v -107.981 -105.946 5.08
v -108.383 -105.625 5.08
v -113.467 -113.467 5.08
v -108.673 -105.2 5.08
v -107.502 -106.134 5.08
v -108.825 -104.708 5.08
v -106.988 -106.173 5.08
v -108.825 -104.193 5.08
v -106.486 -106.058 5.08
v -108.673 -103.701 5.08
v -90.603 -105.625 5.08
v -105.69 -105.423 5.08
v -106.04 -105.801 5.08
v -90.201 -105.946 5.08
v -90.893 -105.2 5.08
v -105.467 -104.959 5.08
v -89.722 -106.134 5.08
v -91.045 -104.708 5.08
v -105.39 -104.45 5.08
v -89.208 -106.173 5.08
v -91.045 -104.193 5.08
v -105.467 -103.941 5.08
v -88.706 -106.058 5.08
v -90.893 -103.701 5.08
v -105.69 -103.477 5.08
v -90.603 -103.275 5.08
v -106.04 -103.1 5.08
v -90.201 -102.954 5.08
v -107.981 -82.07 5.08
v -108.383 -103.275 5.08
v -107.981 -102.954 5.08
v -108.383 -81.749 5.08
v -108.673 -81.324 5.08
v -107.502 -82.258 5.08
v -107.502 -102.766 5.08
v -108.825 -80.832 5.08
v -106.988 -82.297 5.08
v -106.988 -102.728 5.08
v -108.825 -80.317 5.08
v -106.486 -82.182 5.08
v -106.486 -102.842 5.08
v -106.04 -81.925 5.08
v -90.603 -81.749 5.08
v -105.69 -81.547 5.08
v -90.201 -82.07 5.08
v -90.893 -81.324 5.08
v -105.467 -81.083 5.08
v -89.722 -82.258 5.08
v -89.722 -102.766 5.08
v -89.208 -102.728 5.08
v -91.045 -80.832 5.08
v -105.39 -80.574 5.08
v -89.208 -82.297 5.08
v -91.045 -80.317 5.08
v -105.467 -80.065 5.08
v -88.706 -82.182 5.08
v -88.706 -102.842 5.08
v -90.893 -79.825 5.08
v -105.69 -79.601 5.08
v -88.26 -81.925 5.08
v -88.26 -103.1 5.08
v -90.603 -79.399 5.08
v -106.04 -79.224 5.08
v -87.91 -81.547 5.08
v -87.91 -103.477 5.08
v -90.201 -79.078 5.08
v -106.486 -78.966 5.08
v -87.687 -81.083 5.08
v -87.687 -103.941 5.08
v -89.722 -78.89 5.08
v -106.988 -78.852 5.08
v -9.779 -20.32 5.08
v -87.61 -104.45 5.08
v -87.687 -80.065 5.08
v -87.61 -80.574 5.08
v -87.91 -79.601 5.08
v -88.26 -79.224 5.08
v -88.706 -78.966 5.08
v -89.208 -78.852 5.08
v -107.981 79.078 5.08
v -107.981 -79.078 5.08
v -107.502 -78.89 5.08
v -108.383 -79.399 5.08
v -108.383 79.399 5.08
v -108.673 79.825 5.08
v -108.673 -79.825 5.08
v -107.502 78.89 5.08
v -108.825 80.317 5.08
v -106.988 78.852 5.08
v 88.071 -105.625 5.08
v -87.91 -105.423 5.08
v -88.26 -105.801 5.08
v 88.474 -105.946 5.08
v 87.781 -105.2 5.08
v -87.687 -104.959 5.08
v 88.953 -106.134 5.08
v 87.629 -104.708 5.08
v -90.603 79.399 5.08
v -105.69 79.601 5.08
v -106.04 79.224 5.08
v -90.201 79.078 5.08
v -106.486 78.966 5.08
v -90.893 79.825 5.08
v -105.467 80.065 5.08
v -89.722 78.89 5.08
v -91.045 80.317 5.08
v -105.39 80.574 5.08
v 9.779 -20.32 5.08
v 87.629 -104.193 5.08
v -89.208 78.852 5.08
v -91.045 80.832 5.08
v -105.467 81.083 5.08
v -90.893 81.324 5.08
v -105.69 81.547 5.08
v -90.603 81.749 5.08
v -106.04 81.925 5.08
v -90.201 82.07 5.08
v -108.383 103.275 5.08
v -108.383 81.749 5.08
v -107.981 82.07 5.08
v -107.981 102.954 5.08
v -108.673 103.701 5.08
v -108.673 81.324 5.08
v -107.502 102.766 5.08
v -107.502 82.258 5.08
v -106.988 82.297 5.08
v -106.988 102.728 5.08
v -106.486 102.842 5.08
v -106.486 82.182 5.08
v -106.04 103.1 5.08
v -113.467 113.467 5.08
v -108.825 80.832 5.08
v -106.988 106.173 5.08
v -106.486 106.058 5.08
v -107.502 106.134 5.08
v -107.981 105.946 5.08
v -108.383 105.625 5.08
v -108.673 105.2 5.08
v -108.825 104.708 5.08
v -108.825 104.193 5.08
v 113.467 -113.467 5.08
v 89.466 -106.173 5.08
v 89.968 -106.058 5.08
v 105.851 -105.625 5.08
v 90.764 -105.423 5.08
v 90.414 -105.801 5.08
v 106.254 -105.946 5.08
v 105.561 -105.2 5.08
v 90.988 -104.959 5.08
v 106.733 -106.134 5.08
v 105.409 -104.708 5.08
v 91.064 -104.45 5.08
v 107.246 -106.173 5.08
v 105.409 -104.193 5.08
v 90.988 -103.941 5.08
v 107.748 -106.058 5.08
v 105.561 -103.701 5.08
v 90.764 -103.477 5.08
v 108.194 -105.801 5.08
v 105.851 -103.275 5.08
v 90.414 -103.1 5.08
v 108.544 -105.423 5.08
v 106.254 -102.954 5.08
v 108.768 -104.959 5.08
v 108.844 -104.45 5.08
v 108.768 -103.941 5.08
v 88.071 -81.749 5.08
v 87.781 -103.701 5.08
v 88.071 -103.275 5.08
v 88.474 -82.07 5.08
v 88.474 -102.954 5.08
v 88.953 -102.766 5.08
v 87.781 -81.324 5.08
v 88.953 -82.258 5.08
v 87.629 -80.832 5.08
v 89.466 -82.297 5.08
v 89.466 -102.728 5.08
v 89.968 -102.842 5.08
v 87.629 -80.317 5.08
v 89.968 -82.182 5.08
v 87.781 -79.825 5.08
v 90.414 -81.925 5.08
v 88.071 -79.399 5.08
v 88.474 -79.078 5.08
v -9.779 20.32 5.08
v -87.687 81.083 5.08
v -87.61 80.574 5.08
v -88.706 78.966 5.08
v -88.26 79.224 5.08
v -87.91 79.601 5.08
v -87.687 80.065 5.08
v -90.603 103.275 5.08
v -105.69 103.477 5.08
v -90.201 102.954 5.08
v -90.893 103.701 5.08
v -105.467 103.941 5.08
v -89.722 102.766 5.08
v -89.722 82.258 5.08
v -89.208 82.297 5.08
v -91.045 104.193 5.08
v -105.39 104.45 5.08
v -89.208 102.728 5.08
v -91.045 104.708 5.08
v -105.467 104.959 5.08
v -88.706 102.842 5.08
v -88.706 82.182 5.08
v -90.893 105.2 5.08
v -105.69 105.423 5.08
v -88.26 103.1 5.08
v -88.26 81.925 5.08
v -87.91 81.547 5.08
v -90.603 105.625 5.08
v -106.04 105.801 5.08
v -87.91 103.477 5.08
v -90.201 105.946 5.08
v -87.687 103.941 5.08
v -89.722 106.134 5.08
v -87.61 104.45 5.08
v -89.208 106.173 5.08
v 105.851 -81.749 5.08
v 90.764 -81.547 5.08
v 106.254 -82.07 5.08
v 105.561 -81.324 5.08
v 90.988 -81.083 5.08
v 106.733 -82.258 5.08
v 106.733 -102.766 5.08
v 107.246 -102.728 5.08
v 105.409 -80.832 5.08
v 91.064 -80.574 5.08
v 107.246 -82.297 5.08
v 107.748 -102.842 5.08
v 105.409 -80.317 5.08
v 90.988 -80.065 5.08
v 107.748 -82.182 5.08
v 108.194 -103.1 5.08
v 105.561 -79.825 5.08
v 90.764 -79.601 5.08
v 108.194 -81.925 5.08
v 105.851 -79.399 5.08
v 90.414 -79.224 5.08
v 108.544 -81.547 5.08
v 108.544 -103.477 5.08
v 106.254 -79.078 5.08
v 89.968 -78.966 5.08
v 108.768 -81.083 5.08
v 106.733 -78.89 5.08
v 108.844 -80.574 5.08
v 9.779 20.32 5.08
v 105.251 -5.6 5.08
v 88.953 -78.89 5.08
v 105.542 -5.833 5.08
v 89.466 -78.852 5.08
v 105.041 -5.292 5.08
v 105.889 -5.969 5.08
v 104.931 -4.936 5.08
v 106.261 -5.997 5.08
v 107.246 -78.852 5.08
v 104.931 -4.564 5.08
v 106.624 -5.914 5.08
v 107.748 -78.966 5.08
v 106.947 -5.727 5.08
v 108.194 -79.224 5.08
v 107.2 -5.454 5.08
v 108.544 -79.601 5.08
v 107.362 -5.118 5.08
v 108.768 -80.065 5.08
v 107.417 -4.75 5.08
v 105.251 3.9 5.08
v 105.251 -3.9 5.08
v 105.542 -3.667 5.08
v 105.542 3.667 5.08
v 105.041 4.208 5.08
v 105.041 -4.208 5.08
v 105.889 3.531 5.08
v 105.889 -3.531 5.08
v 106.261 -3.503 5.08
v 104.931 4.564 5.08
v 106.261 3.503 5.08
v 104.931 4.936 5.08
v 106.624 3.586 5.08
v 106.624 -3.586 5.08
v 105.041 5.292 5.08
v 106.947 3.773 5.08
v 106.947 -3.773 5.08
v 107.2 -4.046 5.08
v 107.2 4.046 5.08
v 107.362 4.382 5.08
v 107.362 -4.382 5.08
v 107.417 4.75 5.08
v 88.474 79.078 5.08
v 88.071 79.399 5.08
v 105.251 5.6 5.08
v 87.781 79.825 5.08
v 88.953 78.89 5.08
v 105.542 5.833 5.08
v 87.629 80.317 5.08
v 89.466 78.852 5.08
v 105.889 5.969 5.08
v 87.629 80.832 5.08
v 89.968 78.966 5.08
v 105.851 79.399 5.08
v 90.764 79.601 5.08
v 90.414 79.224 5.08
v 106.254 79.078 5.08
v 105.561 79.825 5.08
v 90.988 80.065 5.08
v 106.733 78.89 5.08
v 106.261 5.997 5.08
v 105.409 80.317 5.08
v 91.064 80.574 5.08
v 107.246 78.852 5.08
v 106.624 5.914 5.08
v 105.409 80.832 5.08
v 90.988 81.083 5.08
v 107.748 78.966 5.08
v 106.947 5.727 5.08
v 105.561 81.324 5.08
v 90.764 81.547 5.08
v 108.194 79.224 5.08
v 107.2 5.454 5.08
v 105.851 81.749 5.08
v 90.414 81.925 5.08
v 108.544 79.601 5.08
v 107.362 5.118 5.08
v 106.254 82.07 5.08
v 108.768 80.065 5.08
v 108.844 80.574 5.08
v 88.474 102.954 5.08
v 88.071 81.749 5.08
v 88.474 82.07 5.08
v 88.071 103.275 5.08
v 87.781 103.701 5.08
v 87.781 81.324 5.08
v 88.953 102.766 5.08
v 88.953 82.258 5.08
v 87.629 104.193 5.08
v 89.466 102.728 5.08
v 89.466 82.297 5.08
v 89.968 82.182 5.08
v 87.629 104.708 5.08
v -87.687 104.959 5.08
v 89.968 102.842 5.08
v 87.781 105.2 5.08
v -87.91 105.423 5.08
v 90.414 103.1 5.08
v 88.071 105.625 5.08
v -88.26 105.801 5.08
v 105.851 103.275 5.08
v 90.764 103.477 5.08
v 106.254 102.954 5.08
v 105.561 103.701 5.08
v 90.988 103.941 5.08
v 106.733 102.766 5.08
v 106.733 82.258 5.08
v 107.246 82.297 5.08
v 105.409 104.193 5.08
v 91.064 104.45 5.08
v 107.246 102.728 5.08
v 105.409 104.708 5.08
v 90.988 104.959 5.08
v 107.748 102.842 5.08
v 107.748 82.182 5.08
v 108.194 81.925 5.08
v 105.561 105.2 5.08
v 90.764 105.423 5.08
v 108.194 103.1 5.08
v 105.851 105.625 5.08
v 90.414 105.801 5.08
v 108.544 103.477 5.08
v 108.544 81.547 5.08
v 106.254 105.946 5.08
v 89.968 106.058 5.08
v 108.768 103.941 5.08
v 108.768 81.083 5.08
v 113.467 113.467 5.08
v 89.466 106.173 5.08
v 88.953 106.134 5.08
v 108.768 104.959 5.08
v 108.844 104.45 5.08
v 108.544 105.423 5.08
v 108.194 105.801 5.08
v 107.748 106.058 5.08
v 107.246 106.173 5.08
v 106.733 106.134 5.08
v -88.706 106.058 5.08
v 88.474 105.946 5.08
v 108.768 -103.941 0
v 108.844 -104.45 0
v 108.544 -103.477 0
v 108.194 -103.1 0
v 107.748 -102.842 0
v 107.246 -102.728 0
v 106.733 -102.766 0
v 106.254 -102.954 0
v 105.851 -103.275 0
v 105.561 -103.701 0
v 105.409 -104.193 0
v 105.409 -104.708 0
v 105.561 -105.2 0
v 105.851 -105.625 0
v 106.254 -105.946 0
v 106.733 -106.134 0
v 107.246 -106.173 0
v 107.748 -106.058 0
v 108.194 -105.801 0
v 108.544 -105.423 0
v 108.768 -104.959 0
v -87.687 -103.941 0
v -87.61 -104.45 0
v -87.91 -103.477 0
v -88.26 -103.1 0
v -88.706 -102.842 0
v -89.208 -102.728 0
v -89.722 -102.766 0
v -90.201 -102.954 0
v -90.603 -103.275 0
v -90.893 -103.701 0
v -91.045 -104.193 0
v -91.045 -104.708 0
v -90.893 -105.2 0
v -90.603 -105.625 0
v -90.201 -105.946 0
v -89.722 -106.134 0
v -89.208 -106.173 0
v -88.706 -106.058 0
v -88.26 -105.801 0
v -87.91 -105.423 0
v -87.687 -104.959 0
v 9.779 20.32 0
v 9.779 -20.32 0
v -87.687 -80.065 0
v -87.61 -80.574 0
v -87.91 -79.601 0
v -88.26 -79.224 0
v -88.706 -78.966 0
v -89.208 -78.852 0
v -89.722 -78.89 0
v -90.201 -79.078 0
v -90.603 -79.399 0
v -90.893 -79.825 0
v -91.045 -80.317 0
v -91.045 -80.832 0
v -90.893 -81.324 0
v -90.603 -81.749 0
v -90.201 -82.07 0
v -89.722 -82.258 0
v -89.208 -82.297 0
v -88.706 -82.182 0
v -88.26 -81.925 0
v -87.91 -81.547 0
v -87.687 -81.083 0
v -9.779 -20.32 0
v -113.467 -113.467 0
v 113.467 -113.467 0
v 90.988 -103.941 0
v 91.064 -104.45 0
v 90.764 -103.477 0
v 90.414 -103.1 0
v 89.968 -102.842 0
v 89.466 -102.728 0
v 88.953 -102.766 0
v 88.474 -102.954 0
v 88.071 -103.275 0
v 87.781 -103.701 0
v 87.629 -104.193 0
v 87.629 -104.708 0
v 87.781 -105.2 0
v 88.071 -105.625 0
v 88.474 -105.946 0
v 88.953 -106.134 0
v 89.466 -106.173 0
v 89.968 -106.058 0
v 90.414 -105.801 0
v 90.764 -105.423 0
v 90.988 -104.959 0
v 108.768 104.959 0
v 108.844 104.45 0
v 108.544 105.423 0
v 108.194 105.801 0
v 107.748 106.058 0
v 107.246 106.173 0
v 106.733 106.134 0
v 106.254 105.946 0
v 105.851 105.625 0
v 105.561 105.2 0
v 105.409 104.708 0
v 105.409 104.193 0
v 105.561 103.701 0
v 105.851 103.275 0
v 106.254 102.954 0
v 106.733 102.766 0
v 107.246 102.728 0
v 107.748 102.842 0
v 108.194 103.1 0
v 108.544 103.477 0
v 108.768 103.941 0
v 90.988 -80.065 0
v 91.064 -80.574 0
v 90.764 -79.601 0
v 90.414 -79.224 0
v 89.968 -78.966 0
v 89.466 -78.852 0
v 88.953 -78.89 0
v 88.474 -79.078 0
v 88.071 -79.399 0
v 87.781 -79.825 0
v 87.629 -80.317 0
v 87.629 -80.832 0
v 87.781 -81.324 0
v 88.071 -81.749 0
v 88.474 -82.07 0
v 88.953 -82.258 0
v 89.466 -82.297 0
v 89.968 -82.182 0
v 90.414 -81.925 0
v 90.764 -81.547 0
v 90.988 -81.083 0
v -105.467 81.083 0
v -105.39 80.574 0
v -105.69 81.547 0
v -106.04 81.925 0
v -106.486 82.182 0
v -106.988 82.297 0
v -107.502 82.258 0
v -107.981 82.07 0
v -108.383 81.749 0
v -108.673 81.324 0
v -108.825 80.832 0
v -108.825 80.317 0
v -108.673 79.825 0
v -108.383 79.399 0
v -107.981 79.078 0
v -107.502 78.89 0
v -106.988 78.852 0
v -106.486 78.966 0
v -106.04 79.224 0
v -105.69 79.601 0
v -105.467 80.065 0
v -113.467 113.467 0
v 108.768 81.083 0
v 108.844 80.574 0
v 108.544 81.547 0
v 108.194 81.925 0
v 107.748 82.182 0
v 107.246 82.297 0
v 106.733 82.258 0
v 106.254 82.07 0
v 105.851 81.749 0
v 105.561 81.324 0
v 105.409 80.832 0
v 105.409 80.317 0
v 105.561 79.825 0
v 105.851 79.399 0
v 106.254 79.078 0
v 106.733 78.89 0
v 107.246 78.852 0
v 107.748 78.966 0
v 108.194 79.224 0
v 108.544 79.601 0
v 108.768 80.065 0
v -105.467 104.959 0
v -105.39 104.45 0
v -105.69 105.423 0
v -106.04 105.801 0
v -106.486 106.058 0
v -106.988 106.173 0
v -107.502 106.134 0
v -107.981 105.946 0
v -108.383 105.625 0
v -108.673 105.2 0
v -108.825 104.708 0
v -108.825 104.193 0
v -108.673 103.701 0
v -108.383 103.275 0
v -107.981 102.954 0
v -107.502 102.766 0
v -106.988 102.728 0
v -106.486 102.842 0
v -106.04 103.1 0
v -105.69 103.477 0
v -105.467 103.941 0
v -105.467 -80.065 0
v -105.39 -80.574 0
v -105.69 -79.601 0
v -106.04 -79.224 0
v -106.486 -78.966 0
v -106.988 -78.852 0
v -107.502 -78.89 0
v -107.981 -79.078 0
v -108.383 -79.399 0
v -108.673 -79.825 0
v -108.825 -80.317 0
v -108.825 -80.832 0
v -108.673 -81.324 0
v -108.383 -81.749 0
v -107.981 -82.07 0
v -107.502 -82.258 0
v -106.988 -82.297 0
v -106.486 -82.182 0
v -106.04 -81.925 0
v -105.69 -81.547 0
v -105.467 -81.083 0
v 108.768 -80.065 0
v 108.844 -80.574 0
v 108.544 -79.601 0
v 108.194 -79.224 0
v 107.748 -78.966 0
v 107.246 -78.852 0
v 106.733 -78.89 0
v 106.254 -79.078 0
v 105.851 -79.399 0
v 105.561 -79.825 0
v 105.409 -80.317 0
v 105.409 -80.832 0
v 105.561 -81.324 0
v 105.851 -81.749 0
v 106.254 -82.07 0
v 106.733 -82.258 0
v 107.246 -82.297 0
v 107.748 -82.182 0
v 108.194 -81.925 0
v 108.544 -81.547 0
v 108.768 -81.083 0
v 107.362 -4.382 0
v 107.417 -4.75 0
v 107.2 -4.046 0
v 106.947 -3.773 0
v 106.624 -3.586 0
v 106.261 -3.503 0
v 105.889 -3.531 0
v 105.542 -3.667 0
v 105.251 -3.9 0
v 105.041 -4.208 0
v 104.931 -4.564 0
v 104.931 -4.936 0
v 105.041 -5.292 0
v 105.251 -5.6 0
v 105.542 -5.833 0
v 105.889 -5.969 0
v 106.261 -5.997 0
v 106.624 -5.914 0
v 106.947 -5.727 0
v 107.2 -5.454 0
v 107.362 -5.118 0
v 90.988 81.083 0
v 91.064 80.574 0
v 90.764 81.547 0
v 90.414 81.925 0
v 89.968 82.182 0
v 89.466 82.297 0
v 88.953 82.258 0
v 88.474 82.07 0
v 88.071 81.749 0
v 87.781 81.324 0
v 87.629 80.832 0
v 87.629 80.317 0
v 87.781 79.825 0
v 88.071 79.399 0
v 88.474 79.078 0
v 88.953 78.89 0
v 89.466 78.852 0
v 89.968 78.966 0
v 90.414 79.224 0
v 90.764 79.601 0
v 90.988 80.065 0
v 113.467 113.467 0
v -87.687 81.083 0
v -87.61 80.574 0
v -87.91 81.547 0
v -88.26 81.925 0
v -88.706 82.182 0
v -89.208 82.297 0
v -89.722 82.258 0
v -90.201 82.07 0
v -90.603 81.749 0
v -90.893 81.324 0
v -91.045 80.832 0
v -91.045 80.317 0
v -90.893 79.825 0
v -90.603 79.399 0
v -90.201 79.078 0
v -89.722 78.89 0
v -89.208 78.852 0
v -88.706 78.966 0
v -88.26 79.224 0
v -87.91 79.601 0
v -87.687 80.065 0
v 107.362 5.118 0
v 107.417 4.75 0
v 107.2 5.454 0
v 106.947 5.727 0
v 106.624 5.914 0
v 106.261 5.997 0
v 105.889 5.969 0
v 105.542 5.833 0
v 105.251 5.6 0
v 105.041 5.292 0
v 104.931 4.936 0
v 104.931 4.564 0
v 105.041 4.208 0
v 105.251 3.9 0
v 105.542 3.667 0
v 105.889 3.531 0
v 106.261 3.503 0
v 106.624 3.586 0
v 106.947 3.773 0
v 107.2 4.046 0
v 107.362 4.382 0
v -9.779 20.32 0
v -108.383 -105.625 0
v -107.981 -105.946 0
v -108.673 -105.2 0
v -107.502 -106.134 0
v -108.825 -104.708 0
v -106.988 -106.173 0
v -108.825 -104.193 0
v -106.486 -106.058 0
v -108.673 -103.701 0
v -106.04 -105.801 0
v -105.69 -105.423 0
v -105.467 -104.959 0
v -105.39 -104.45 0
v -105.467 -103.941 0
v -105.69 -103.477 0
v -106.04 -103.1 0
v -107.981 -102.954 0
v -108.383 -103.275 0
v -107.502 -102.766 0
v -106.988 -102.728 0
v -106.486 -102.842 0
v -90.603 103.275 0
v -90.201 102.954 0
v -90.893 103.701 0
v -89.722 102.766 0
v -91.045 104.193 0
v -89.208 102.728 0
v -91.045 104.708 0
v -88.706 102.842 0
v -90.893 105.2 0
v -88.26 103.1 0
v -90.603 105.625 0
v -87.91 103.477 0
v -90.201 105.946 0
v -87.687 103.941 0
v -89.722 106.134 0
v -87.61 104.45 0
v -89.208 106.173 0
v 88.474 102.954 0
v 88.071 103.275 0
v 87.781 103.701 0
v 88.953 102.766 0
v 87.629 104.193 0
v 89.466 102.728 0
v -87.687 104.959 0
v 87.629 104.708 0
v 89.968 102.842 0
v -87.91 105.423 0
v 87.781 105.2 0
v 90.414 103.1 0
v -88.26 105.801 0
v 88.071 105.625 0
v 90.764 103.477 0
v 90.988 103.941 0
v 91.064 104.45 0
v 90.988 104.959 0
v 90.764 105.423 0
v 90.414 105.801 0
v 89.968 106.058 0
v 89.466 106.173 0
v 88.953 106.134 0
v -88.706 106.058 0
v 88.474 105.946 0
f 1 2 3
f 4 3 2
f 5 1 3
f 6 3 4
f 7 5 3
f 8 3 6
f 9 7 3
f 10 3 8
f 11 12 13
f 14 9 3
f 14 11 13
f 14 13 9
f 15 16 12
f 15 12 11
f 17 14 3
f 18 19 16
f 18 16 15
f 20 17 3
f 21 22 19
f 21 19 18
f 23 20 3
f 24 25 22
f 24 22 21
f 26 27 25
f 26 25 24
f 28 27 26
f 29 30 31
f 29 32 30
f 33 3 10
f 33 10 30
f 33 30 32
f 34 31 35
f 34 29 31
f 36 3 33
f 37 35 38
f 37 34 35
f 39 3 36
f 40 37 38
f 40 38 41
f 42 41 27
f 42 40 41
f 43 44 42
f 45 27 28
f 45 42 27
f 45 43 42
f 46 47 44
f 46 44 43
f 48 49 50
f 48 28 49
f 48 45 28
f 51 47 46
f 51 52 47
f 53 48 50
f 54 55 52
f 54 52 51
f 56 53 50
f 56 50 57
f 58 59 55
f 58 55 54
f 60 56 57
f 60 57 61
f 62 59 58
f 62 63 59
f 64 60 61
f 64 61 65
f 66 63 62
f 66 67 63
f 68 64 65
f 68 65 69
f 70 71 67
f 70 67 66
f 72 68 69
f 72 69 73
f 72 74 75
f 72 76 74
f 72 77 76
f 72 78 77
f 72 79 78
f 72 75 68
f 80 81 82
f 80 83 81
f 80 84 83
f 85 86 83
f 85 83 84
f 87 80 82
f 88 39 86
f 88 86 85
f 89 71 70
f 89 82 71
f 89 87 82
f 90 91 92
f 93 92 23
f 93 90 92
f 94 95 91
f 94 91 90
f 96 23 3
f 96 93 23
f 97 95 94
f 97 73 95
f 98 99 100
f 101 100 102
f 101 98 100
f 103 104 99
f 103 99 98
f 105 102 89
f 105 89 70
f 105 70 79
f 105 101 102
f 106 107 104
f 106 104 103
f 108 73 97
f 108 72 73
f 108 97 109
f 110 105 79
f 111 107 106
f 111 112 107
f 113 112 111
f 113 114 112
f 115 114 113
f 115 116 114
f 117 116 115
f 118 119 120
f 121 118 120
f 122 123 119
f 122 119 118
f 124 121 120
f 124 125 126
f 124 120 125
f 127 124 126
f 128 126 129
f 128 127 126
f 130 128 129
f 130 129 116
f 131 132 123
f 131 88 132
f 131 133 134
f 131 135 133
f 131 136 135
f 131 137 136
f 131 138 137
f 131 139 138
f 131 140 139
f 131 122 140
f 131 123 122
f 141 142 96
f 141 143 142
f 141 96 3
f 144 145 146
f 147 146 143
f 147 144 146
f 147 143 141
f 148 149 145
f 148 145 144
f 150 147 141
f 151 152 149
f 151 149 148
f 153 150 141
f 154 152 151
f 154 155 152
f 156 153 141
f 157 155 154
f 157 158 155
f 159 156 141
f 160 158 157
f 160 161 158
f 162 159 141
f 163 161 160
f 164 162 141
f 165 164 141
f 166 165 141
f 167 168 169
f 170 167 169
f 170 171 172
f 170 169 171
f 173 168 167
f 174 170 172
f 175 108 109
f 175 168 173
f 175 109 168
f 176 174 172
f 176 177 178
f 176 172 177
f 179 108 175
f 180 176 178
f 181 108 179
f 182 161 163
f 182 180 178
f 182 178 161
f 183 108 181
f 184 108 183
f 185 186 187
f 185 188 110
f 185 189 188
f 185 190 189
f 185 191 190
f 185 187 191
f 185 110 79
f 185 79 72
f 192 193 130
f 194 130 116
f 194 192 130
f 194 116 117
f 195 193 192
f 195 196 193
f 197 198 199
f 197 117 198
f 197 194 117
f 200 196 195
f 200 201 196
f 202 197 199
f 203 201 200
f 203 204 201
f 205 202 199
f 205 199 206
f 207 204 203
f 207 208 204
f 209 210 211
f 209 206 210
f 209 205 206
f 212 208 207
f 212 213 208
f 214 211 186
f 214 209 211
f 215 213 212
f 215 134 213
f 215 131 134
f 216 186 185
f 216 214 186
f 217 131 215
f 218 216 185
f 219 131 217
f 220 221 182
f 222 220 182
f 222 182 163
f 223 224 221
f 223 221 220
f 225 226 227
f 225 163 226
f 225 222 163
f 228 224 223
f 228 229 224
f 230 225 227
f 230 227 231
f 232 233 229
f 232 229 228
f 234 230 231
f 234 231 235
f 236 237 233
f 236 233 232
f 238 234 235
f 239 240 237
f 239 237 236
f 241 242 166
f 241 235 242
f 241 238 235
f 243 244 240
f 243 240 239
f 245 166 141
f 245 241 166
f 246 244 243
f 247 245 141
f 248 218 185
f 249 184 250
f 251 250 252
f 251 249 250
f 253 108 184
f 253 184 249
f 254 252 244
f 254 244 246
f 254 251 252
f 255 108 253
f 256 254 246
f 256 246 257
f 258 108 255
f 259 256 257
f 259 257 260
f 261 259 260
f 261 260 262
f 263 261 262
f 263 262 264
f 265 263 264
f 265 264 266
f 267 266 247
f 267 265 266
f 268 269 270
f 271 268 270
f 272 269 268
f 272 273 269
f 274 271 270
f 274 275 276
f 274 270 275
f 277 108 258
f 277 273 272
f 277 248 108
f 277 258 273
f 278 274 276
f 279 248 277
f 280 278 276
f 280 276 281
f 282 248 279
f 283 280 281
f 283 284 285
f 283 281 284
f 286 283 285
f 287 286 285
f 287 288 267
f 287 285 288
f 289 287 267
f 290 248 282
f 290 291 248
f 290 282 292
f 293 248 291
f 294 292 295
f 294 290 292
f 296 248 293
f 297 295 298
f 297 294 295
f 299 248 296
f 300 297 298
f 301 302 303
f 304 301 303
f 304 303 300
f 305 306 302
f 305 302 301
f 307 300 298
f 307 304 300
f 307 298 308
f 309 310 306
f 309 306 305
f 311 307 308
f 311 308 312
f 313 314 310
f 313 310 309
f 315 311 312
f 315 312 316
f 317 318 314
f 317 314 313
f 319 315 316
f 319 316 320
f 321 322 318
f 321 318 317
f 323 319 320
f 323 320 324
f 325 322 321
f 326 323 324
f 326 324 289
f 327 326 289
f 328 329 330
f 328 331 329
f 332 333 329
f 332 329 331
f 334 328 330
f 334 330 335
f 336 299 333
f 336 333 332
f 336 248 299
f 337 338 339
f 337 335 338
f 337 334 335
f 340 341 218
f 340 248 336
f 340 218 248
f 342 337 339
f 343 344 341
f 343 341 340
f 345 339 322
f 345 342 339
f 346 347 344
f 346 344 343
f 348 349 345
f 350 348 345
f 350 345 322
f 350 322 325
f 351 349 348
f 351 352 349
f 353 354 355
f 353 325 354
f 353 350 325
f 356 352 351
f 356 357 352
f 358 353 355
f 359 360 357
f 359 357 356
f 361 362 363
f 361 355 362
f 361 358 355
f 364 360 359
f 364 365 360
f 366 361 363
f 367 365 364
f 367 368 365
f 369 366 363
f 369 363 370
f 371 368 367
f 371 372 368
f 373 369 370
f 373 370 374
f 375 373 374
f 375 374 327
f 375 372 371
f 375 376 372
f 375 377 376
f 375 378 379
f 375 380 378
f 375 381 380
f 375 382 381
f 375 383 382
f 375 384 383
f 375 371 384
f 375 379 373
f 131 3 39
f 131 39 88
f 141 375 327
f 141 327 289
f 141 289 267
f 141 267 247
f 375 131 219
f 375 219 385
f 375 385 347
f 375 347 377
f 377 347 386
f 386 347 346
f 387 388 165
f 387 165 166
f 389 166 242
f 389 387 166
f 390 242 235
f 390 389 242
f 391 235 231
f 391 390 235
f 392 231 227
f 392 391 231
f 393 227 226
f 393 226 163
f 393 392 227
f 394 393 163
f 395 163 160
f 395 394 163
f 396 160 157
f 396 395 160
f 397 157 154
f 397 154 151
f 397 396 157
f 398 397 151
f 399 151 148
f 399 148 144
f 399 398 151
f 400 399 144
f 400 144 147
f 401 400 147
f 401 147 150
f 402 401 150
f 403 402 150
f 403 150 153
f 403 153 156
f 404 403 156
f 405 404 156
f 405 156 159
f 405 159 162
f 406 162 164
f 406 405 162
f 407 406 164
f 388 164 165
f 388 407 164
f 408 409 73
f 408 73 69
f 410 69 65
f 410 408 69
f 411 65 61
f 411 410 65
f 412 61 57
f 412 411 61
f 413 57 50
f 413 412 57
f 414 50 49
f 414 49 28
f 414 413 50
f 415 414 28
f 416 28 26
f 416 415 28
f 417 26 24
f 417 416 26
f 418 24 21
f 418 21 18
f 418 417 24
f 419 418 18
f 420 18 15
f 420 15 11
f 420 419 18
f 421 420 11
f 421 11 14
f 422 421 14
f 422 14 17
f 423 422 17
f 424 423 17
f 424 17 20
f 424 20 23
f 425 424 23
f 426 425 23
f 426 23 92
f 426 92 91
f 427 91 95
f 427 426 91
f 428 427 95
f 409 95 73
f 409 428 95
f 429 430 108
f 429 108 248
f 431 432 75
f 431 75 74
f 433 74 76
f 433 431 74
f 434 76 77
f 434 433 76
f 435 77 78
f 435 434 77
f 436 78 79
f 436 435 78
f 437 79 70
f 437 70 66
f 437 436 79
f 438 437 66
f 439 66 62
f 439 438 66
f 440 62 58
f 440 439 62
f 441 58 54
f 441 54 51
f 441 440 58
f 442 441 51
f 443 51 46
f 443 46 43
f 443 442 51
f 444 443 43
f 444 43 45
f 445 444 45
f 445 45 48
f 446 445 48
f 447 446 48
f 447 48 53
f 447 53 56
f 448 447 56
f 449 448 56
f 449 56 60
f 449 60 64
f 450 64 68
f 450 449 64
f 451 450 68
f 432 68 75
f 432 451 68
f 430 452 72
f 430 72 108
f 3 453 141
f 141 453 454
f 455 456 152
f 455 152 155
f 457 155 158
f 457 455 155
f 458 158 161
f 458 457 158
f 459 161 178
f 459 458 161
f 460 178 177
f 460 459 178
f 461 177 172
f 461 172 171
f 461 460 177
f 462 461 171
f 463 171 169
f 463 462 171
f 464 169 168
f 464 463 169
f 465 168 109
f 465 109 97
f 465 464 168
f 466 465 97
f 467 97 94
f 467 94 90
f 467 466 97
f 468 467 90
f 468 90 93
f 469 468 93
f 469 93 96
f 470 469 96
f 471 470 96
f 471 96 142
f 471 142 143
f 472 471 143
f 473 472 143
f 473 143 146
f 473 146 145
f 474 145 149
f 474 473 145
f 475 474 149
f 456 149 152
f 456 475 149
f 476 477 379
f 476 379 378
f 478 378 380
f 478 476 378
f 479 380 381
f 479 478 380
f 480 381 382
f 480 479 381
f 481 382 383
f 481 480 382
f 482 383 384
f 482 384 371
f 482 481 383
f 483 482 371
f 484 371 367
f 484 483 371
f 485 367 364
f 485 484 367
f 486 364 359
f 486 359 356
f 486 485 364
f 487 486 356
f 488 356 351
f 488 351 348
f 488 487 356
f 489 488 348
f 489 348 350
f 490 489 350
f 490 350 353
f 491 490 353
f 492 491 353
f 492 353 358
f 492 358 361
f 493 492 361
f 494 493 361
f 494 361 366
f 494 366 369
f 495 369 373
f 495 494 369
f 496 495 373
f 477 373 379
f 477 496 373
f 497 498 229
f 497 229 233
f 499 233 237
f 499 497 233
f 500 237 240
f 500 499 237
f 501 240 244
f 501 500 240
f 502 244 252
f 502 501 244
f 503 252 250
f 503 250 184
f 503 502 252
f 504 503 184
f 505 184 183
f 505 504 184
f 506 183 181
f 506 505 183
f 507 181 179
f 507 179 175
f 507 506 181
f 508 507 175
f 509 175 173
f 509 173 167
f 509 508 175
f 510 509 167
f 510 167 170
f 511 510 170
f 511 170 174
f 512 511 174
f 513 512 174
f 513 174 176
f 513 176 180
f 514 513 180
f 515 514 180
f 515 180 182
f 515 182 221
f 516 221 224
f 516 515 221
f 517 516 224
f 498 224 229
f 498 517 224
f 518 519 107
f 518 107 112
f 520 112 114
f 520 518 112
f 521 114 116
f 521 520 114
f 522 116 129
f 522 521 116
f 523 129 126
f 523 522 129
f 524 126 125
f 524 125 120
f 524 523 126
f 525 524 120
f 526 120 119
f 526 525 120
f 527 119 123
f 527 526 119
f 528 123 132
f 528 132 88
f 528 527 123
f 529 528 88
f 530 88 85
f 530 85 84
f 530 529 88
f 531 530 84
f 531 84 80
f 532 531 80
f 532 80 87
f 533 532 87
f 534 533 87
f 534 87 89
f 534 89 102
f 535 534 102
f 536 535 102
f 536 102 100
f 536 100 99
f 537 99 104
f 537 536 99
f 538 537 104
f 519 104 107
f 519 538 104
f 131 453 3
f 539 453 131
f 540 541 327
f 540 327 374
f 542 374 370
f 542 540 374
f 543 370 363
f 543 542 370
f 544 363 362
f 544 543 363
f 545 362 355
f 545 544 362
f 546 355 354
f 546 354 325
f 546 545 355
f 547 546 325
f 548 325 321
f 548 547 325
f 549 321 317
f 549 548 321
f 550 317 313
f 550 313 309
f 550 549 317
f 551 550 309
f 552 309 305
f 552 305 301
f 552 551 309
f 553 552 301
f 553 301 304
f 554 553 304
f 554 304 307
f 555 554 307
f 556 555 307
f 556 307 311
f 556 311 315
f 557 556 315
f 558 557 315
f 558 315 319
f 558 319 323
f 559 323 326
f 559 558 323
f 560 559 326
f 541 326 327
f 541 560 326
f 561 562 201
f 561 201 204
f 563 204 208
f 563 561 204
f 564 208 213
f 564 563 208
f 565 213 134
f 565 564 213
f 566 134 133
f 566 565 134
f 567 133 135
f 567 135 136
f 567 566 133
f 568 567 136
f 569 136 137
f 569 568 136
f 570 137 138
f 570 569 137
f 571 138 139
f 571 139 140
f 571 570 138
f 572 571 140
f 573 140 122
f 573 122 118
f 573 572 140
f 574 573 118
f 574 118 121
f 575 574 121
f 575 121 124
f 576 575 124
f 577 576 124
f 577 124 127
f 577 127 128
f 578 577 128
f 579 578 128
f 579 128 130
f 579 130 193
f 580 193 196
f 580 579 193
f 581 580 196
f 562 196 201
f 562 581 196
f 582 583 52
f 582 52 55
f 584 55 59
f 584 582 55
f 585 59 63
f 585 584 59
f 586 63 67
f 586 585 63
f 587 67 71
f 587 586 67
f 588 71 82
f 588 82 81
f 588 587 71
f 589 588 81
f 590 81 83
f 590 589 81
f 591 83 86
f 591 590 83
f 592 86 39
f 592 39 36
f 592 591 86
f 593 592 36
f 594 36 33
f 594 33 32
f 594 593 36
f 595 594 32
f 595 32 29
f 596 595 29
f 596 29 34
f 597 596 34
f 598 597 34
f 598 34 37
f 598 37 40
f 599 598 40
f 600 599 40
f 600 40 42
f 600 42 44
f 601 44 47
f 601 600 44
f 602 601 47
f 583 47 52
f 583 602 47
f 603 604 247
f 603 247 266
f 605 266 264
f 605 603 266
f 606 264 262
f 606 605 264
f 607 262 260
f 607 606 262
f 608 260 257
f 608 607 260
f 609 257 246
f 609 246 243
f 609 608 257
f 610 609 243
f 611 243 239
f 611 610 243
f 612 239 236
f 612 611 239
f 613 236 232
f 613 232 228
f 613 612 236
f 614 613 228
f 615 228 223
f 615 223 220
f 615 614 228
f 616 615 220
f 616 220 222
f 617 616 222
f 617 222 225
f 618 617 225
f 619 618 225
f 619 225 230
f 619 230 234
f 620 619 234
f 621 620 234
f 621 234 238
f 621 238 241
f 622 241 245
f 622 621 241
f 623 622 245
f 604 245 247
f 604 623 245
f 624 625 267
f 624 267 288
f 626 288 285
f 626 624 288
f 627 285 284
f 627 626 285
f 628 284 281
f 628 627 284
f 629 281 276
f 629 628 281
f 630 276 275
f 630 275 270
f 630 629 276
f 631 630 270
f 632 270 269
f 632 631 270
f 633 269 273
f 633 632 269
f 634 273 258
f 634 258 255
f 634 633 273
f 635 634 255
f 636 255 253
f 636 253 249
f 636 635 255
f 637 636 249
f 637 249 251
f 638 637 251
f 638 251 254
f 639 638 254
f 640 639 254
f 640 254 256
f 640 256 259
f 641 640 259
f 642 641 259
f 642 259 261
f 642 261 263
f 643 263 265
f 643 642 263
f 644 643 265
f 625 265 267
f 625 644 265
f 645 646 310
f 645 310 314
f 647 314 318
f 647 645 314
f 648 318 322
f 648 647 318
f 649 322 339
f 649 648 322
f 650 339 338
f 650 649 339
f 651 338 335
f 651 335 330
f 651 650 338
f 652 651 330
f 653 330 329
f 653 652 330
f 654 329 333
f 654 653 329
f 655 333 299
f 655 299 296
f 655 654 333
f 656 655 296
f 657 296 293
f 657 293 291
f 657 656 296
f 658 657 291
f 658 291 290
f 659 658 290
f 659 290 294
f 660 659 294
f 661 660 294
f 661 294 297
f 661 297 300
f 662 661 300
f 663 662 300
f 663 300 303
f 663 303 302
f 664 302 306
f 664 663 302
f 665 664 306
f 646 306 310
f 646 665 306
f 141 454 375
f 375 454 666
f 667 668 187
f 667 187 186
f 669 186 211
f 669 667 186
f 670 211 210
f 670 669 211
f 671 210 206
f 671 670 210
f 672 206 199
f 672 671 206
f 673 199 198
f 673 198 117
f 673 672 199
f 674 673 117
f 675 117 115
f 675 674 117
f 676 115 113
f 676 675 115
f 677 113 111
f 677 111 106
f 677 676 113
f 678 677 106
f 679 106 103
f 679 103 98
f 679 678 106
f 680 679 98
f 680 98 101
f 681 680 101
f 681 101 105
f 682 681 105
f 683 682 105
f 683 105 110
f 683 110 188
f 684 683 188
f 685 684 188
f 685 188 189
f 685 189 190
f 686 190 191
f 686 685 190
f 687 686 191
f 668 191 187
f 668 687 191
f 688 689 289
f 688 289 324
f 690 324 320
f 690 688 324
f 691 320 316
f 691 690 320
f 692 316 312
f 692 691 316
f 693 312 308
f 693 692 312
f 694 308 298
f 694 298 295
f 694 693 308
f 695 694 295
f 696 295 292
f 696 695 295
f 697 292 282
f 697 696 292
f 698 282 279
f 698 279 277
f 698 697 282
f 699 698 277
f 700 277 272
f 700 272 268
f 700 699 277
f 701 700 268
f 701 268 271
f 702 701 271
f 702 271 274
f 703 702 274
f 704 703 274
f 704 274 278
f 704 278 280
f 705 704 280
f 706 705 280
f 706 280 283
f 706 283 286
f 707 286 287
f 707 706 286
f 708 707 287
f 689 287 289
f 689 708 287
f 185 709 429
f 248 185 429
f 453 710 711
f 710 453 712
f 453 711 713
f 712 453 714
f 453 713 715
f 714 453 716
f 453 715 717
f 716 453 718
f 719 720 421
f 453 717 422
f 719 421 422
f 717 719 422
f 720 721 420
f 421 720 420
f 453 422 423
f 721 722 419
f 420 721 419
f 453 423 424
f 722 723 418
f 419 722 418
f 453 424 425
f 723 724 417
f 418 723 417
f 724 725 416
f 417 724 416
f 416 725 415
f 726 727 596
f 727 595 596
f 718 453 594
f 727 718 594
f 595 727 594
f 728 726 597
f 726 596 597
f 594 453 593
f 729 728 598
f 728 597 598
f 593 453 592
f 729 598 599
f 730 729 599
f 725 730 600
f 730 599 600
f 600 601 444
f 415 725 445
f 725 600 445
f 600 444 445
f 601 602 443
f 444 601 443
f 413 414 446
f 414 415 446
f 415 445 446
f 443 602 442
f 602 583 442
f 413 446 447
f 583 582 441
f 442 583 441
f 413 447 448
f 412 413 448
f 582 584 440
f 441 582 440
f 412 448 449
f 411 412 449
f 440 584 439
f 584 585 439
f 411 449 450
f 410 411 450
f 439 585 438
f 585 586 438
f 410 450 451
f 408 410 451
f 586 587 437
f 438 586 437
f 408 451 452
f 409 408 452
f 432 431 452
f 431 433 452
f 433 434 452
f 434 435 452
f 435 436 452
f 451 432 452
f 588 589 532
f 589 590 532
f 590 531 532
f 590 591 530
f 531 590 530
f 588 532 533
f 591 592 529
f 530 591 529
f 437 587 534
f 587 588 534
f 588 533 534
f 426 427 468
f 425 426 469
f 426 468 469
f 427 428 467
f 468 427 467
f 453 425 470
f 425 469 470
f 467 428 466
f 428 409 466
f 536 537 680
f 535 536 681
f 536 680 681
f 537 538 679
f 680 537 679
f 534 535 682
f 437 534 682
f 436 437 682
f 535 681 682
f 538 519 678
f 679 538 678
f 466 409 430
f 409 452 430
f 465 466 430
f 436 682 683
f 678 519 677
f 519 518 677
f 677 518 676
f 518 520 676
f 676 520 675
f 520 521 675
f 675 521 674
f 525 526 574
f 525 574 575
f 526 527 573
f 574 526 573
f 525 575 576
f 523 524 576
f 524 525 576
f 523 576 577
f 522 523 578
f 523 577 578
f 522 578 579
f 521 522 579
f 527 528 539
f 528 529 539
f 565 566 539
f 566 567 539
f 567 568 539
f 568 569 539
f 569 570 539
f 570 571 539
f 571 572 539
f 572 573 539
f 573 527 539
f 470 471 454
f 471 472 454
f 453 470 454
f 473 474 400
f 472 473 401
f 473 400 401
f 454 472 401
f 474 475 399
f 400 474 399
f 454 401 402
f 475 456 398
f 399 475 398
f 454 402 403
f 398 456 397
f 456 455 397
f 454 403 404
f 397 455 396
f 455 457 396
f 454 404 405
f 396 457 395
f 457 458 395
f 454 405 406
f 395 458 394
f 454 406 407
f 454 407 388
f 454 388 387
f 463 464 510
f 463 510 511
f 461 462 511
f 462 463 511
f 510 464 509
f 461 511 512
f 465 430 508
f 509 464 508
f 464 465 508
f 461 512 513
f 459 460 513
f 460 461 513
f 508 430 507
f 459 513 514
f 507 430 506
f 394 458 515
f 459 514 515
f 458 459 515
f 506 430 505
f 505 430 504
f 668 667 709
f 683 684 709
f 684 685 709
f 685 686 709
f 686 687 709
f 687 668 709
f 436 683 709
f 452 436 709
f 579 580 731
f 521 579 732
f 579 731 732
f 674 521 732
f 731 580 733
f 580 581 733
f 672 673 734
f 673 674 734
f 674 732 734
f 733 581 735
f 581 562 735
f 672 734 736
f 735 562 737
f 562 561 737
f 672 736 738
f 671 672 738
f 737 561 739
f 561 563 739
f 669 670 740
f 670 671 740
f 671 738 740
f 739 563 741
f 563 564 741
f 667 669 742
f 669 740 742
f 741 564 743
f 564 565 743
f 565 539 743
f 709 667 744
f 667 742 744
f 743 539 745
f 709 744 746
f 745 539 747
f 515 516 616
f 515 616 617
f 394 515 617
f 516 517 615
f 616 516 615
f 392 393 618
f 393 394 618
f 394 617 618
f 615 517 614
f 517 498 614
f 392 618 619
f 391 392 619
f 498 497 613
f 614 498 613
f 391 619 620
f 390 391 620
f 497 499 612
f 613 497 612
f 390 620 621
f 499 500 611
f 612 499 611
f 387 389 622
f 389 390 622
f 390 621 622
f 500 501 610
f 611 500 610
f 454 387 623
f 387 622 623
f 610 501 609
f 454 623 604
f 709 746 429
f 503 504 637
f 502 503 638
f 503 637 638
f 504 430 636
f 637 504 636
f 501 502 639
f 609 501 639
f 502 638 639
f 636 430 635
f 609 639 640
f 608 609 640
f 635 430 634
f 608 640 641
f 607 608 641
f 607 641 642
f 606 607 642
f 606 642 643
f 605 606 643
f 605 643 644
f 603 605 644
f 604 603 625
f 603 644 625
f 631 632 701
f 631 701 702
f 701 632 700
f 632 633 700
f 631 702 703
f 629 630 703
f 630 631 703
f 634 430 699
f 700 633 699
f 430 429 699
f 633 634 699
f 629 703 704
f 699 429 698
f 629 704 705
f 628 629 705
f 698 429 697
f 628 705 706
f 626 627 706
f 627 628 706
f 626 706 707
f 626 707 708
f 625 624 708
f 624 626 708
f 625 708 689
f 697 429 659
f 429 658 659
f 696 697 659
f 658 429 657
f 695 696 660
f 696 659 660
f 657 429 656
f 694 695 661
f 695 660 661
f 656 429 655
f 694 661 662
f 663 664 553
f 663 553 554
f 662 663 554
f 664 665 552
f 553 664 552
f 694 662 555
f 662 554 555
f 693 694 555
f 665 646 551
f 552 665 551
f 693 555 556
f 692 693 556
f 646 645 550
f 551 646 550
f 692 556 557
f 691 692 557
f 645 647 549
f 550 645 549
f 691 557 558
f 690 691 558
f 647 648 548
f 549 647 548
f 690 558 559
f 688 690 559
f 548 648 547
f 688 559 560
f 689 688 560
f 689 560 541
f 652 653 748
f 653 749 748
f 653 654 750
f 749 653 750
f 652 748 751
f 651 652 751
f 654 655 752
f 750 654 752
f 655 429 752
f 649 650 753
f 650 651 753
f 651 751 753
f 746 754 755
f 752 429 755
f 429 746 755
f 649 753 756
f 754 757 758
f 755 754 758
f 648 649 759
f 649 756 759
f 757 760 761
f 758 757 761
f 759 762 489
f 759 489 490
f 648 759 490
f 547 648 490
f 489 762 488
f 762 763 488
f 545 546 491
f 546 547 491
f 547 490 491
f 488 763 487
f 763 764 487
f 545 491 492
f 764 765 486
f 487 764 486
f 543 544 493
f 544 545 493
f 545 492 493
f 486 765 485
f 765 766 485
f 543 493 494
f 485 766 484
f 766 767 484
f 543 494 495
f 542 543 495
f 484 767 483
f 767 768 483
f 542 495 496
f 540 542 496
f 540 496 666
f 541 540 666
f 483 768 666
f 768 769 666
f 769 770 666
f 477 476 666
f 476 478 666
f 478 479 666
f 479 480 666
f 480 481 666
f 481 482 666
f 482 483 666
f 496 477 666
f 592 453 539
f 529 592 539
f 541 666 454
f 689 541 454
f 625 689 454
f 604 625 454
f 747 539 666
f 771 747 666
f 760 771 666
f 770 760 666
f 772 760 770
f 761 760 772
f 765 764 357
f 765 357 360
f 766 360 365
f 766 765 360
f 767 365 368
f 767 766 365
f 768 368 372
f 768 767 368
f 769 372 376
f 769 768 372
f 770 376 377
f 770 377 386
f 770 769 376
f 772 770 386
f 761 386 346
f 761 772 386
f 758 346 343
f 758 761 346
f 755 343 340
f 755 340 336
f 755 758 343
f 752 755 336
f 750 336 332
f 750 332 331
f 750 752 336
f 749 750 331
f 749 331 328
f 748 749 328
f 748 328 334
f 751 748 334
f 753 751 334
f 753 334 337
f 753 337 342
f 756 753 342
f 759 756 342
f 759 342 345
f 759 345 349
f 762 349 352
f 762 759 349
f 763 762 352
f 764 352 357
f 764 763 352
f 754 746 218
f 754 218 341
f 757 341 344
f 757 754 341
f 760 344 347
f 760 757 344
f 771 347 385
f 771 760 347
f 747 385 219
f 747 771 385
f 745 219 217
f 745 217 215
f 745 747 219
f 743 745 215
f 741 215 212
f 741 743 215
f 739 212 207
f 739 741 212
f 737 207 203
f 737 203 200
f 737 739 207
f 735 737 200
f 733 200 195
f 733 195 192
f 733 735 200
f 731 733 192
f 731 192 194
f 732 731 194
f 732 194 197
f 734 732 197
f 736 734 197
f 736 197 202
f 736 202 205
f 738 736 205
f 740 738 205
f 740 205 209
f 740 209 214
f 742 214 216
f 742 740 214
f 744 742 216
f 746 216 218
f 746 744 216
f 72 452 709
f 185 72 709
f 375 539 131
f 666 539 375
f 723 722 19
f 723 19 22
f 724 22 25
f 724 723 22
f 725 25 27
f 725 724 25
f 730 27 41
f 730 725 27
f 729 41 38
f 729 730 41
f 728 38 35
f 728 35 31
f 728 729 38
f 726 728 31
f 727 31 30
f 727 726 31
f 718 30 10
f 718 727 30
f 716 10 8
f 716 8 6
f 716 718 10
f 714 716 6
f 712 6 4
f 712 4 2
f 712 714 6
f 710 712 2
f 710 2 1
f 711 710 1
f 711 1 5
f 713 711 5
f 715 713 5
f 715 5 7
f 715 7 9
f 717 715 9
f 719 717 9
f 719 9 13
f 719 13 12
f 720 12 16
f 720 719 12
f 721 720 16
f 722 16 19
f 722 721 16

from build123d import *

# Parameters (mm, degrees)
F0_W     = 226.934572
F0_H     = 226.934572
F0_R     = 1.7272
F0_W_2   = 19.558
F0_H_2   = 40.64
F0_R_2   = 1.25
F1_DEPTH = 5.08


with BuildPart() as f1:
    # F0 (on Top) → F1 (new body)
    with BuildSketch(Plane.XY):
        Rectangle(F0_W, F0_H)
        with Locations((-107.117286, -104.450286)):
            Circle(F0_R, mode=Mode.SUBTRACT)
        with Locations((-89.337286, -104.450286)):
            Circle(F0_R, mode=Mode.SUBTRACT)
        with Locations((-107.117286, -80.574286)):
            Circle(F0_R, mode=Mode.SUBTRACT)
        with Locations((-89.337286, -80.574286)):
            Circle(F0_R, mode=Mode.SUBTRACT)
        Rectangle(F0_W_2, F0_H_2, mode=Mode.SUBTRACT)
        with Locations((89.337286, -104.450286)):
            Circle(F0_R, mode=Mode.SUBTRACT)
        with Locations((107.117286, -104.450286)):
            Circle(F0_R, mode=Mode.SUBTRACT)
        with Locations((89.337286, -80.574286)):
            Circle(F0_R, mode=Mode.SUBTRACT)
        with Locations((107.117286, -80.574286)):
            Circle(F0_R, mode=Mode.SUBTRACT)
        with Locations((106.167276, -4.750003)):
            Circle(F0_R_2, mode=Mode.SUBTRACT)
        with Locations((-107.117286, 80.574286)):
            Circle(F0_R, mode=Mode.SUBTRACT)
        with Locations((-89.337286, 80.574286)):
            Circle(F0_R, mode=Mode.SUBTRACT)
        with Locations((-107.117286, 104.450286)):
            Circle(F0_R, mode=Mode.SUBTRACT)
        with Locations((-89.337286, 104.450286)):
            Circle(F0_R, mode=Mode.SUBTRACT)
        with Locations((106.167276, 4.750003)):
            Circle(F0_R_2, mode=Mode.SUBTRACT)
        with Locations((89.337286, 80.574286)):
            Circle(F0_R, mode=Mode.SUBTRACT)
        with Locations((107.117286, 80.574286)):
            Circle(F0_R, mode=Mode.SUBTRACT)
        with Locations((89.337286, 104.450286)):
            Circle(F0_R, mode=Mode.SUBTRACT)
        with Locations((107.117286, 104.450286)):
            Circle(F0_R, mode=Mode.SUBTRACT)
    extrude(amount=F1_DEPTH)


solid = f1.part
